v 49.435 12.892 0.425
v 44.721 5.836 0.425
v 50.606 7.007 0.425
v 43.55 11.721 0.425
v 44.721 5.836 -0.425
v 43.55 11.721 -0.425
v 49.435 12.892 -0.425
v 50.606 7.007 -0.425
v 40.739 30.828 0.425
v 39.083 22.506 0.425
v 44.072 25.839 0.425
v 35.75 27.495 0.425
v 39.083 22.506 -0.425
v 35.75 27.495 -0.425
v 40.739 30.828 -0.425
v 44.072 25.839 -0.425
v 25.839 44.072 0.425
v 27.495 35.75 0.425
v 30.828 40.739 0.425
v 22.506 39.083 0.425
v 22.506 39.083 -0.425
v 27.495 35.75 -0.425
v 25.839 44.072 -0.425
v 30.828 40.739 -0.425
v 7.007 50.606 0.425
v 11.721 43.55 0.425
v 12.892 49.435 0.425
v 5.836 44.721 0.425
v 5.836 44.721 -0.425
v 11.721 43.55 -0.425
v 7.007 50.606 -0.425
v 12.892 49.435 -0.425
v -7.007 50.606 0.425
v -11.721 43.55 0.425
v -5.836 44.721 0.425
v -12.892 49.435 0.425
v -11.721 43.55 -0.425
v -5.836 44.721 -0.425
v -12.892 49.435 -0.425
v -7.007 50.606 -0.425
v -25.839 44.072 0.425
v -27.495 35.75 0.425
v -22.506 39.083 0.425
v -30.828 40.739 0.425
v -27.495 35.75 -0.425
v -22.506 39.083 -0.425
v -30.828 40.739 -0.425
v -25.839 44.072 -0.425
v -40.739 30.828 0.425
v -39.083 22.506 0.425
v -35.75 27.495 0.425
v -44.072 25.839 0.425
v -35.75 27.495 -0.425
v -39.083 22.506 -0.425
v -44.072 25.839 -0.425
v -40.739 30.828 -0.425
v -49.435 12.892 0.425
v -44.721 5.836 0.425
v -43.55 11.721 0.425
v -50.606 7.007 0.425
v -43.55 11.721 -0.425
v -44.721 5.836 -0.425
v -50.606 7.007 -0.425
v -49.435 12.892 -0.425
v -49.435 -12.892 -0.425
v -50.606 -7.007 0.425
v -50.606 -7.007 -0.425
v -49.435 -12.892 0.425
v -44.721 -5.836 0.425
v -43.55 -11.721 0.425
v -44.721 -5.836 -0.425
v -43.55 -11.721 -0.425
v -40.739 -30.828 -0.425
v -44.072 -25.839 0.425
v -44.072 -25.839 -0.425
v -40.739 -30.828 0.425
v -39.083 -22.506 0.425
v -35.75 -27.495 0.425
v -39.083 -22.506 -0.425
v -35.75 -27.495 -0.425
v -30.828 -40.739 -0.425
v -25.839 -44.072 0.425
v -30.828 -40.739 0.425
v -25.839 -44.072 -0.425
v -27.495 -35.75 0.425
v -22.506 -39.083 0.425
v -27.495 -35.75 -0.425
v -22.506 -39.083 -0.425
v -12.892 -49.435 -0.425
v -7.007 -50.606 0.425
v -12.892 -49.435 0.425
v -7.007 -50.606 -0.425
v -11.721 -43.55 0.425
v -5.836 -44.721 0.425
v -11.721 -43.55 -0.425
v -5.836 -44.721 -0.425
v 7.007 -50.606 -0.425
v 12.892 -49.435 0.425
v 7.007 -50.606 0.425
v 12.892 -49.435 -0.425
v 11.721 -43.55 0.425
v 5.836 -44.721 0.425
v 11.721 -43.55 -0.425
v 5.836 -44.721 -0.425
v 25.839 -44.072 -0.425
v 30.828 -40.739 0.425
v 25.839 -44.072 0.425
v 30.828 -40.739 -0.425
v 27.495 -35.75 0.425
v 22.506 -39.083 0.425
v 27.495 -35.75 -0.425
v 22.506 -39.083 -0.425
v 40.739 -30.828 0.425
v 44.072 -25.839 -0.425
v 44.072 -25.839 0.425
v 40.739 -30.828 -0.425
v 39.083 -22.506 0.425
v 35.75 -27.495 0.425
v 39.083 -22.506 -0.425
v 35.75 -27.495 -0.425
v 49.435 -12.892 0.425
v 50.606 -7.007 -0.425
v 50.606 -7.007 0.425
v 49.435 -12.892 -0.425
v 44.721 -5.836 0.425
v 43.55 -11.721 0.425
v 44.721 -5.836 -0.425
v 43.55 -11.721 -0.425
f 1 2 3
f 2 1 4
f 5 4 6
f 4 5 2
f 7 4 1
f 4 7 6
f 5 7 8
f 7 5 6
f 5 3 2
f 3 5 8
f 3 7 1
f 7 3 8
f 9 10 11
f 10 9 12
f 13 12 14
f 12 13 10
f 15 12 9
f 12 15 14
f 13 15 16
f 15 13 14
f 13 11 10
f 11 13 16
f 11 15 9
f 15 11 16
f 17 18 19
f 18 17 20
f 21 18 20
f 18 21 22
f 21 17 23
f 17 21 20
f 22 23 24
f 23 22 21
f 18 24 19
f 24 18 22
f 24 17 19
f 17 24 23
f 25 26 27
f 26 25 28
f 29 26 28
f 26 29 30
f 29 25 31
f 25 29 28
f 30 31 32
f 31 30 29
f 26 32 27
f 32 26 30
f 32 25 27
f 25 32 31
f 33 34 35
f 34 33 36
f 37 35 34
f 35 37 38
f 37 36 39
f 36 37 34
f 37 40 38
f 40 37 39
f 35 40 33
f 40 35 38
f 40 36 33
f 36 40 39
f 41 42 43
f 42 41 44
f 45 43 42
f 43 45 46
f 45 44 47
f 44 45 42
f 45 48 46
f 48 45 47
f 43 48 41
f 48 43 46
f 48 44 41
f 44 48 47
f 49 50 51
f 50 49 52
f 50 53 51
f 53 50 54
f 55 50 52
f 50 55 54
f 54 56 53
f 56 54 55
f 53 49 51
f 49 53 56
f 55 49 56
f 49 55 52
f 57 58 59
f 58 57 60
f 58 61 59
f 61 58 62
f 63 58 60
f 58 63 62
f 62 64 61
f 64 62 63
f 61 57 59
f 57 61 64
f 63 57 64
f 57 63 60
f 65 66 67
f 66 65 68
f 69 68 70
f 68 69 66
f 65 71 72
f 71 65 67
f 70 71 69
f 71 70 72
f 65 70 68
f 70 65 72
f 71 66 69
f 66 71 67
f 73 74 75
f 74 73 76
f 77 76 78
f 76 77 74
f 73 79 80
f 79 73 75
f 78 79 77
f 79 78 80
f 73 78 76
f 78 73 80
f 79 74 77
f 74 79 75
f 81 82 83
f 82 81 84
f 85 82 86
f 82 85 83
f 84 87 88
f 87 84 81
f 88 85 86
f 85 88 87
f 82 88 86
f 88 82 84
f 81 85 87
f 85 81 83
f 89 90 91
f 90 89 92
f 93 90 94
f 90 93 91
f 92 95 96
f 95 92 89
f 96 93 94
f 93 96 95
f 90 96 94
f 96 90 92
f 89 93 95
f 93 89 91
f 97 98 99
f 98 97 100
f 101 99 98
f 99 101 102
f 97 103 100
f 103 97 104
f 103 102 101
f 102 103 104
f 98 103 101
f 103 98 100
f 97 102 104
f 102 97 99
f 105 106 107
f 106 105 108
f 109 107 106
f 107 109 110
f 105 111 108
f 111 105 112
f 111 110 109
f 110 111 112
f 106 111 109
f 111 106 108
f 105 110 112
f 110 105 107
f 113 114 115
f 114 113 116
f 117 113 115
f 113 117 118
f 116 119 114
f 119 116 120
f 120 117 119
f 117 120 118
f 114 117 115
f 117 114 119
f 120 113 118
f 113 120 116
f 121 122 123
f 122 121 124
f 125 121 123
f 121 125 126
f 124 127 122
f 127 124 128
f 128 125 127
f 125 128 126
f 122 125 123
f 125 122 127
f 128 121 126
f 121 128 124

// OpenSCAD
// ============================================================================
// Atom Lithography Machine — Parametric OpenSCAD Module (S2.4-01)
// ============================================================================
// part_id           : S2.4-01
// parent_bom_id     : S2.4
// subsystem         : S2
// part_name         : SKY130 blanker_tile 64-kanalli surucu ASIC yongalari (16 aktif karo + yedek, 1024 ch)
// material          : Si
// temp_stage        : 300 K / 4 K uyumlu
// vacuum_grade      : UHV 1e-9 mbar
// tolerance         : Anten ECO kapali
// computed_mass_kg  : 0.00114
// envelope_mm       : 101.152 x 101.152 x 0.850
// design_maturity   : M0_M1_DETAILED_CAD_DESIGN_ONLY
// no_lab_measurement: true
// iec61508_certified: false
// semi_s2_certified : false
// Units: millimeters (mm)
// ============================================================================

$fn = 64;

// Nominal bounding envelope parameters (mm)
bbox_x = 101.1521;
bbox_y = 101.1521;
bbox_z = 0.8500;

// Part-specific parametric dimensions
active_tiles = 16;
spare_tiles = 8;
ch_per_tile = 64;
tile_pcd = 96.0;
pkg_xy = 6.0;

// Interface / port parameters (mm)
port_tile_solder_pad_ring_od = 104.500;
port_tile_solder_pad_ring_bore = 87.500;
port_tile_solder_pad_ring_pcd = 96.000;
port_tile_solder_pad_ring_bolts = 16;

module part_S2_4_01() {
  union() {
    // SKY130 tile #1
    translate([47.078, 9.364, 0.000]) rotate([0.000, 0.000, 11.250]) cube([6.000, 6.000, 0.850], center=true);
    translate([39.911, 26.667, 0.000]) rotate([0.000, 0.000, 33.750]) cube([6.000, 6.000, 0.850], center=true);
    translate([26.667, 39.911, 0.000]) rotate([0.000, 0.000, 56.250]) cube([6.000, 6.000, 0.850], center=true);
    translate([9.364, 47.078, 0.000]) rotate([0.000, 0.000, 78.750]) cube([6.000, 6.000, 0.850], center=true);
    translate([-9.364, 47.078, 0.000]) rotate([0.000, 0.000, 101.250]) cube([6.000, 6.000, 0.850], center=true);
    translate([-26.667, 39.911, 0.000]) rotate([0.000, 0.000, 123.750]) cube([6.000, 6.000, 0.850], center=true);
    translate([-39.911, 26.667, 0.000]) rotate([0.000, 0.000, 146.250]) cube([6.000, 6.000, 0.850], center=true);
    translate([-47.078, 9.364, 0.000]) rotate([0.000, 0.000, 168.750]) cube([6.000, 6.000, 0.850], center=true);
    translate([-47.078, -9.364, 0.000]) rotate([0.000, 0.000, 191.250]) cube([6.000, 6.000, 0.850], center=true);
    translate([-39.911, -26.667, 0.000]) rotate([0.000, 0.000, 213.750]) cube([6.000, 6.000, 0.850], center=true);
    translate([-26.667, -39.911, 0.000]) rotate([0.000, 0.000, 236.250]) cube([6.000, 6.000, 0.850], center=true);
    translate([-9.364, -47.078, 0.000]) rotate([0.000, 0.000, 258.750]) cube([6.000, 6.000, 0.850], center=true);
    translate([9.364, -47.078, 0.000]) rotate([0.000, 0.000, 281.250]) cube([6.000, 6.000, 0.850], center=true);
    translate([26.667, -39.911, 0.000]) rotate([0.000, 0.000, 303.750]) cube([6.000, 6.000, 0.850], center=true);
    translate([39.911, -26.667, 0.000]) rotate([0.000, 0.000, 326.250]) cube([6.000, 6.000, 0.850], center=true);
    translate([47.078, -9.364, 0.000]) rotate([0.000, 0.000, 348.750]) cube([6.000, 6.000, 0.850], center=true);
  }
}

// World assembly mounting transform (global machine frame, mm / deg):
// translate([0.000, 0.000, 5.825]) rotate([0.000, 0.000, 0.000]) part_S2_4_01();

part_S2_4_01();
